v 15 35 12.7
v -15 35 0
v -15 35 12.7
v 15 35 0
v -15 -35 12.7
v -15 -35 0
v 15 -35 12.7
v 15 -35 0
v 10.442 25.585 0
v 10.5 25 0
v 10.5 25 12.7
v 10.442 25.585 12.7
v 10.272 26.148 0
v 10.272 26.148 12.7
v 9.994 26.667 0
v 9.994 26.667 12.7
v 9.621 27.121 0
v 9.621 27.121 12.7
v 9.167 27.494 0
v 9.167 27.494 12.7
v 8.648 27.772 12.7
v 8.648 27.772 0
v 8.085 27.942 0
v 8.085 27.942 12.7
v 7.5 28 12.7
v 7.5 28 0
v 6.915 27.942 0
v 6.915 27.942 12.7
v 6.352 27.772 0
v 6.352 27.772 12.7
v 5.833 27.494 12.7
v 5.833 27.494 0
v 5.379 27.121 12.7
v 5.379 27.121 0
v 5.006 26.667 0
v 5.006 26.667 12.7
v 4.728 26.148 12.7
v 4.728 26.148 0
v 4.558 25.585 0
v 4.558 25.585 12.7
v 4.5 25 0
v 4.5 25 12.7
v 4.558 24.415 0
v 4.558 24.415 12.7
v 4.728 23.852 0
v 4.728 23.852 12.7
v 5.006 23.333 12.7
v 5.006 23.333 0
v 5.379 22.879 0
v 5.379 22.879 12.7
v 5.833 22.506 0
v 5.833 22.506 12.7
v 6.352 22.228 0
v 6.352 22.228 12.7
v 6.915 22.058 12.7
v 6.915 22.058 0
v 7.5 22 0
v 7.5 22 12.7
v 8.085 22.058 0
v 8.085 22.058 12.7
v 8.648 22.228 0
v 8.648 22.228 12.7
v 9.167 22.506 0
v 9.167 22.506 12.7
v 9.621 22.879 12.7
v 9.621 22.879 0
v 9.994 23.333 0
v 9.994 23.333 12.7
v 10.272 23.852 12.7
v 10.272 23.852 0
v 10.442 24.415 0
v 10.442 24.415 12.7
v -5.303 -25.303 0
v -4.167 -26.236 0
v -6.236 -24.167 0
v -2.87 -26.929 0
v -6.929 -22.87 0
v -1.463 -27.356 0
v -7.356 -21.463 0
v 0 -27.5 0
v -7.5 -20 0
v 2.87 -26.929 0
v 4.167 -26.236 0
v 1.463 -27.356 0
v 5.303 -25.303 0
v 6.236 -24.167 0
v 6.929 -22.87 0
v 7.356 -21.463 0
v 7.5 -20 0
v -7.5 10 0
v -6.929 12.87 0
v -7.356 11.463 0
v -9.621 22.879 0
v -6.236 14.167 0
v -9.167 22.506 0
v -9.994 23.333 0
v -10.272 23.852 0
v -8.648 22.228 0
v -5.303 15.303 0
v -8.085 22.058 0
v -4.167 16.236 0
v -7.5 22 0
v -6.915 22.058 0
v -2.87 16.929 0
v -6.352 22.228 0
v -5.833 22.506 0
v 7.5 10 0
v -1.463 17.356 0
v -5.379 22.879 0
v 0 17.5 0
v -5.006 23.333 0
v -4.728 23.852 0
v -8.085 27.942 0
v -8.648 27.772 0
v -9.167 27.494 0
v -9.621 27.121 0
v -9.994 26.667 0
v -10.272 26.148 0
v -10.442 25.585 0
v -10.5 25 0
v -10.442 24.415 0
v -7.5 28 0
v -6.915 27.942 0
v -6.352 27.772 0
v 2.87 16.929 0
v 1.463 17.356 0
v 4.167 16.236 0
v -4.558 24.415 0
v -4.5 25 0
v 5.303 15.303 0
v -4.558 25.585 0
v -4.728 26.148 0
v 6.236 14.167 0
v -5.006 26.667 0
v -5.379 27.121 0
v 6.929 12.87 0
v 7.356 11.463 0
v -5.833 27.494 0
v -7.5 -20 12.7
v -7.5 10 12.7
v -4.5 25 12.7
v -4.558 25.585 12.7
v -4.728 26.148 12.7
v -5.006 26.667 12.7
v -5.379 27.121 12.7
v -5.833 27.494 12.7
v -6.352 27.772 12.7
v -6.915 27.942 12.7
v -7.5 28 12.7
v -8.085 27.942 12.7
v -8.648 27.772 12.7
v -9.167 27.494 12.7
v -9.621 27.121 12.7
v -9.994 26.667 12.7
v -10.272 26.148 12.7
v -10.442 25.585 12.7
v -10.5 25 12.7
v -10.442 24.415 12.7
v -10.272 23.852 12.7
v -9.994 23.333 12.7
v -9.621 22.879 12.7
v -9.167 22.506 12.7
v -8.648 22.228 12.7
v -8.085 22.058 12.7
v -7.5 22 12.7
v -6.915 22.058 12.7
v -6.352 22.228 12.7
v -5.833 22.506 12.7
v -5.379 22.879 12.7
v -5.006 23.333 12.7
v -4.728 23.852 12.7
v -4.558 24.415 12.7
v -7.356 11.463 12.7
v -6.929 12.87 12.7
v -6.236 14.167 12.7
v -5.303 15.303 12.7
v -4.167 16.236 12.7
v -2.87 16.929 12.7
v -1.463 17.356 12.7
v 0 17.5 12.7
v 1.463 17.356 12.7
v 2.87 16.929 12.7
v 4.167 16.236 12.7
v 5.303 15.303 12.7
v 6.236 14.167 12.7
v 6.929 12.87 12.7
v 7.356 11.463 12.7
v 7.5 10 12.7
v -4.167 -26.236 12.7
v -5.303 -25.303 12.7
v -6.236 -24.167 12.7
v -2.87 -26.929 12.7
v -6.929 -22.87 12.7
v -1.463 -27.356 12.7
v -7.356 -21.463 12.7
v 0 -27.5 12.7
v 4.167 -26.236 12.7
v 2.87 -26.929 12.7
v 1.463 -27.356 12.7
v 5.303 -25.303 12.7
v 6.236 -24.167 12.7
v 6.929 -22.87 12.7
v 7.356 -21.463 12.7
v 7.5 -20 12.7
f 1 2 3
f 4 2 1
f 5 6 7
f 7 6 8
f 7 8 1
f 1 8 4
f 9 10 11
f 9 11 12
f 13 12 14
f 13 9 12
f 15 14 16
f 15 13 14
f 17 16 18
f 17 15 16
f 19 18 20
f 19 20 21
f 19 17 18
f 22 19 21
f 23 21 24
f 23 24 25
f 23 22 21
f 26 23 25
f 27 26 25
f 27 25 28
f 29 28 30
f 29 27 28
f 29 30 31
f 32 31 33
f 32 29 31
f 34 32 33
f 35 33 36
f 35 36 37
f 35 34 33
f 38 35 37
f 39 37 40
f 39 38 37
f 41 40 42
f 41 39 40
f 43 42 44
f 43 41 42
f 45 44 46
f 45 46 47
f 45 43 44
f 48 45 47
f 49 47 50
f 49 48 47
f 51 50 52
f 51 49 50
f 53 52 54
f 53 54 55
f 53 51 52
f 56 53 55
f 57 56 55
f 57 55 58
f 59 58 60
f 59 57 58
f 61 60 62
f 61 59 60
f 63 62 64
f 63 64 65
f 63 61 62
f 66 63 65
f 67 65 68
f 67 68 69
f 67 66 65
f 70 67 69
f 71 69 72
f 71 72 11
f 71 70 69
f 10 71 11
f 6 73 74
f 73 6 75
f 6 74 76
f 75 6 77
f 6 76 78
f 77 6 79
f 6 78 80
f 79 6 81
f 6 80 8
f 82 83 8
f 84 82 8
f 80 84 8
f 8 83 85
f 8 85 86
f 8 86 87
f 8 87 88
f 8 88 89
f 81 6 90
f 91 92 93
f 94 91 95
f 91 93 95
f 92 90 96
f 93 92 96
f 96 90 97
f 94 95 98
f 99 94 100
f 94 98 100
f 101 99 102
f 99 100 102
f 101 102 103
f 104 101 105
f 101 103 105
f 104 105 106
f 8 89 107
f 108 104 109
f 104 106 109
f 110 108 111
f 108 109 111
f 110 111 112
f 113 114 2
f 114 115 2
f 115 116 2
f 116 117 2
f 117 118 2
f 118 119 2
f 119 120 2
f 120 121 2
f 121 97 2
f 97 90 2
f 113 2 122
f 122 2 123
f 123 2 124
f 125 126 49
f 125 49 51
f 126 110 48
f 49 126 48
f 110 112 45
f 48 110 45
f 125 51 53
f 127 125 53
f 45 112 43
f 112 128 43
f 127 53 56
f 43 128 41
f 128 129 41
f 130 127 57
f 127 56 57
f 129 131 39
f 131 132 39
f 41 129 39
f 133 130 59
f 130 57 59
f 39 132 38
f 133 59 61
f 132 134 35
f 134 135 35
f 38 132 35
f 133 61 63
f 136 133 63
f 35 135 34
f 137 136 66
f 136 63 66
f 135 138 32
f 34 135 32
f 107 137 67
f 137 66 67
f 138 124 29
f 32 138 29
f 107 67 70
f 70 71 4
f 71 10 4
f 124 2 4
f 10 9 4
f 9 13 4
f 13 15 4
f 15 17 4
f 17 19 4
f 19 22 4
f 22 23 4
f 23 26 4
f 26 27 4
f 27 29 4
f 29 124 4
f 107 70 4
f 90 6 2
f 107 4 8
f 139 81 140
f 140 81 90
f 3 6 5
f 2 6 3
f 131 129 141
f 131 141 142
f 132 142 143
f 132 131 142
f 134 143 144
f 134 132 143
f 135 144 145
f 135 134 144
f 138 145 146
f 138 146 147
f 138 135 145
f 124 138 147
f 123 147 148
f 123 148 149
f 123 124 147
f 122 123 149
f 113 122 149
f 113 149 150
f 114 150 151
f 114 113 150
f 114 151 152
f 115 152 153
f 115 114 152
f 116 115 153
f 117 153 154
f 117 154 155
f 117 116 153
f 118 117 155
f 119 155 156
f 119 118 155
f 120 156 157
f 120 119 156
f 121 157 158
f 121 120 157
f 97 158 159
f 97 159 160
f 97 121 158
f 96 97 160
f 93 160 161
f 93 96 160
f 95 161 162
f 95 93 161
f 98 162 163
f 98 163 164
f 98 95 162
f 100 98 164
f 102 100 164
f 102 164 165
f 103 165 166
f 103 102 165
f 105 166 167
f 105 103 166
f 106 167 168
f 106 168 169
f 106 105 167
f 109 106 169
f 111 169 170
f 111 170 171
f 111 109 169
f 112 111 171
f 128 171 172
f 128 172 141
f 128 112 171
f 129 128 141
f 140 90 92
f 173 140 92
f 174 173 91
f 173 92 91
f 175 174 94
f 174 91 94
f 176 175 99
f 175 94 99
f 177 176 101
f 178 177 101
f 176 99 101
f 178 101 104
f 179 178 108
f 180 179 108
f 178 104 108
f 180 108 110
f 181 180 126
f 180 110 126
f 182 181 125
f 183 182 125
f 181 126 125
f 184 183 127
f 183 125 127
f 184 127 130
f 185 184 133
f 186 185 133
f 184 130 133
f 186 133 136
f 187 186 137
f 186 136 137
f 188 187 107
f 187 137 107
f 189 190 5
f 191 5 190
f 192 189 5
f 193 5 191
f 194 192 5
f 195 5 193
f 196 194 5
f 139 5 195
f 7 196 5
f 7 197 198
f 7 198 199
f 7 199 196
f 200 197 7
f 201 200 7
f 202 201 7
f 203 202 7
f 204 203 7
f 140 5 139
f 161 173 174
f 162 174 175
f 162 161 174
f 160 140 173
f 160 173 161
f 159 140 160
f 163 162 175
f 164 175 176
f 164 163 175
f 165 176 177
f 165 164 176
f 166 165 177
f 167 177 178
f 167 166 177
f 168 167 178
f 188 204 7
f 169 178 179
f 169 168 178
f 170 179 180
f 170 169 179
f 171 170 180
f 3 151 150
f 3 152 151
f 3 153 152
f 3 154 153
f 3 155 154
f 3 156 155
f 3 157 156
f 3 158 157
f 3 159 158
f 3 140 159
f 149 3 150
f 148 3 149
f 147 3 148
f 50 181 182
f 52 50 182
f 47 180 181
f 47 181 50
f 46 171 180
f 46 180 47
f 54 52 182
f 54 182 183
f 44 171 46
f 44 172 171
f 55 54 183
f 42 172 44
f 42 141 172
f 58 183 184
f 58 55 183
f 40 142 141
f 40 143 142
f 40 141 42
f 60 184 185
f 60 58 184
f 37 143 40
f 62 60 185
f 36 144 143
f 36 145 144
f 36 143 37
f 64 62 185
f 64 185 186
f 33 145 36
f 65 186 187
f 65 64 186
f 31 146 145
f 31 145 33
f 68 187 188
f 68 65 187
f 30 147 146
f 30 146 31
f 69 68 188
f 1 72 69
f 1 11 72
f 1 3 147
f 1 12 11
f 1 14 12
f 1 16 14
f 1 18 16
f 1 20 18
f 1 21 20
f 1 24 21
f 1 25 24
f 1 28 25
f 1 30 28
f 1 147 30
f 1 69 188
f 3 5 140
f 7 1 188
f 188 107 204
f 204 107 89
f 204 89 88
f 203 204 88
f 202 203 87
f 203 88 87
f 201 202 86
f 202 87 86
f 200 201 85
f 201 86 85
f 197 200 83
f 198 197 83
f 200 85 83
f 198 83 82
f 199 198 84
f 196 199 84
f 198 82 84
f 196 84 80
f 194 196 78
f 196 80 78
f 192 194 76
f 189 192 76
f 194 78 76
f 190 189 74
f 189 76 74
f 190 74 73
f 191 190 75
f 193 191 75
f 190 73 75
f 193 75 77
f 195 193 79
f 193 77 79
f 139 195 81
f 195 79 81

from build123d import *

# Parameters (mm, degrees)
CROQUIS1_W              = 30
CROQUIS1_H              = 70
CROQUIS1_R              = 3
SALIENTE_EXTRUIR1_DEPTH = 12.7


with BuildPart() as part:
    # Croquis1 → Saliente-Extruir1 (new body)
    with BuildSketch(Plane.XY):
        Rectangle(CROQUIS1_W, CROQUIS1_H)
        with Locations((-7.5, 25)):
            Circle(CROQUIS1_R, mode=Mode.SUBTRACT)
        with Locations((7.5, 25)):
            Circle(CROQUIS1_R, mode=Mode.SUBTRACT)
        with BuildLine():
            Line((7.5, 10), (7.5, -20))
            ThreePointArc((7.5, -20), (0, -27.5), (-7.5, -20))
            Line((-7.5, -20), (-7.5, 10))
            ThreePointArc((-7.5, 10), (0, 17.5), (7.5, 10))
        make_face(mode=Mode.SUBTRACT)
    extrude(amount=SALIENTE_EXTRUIR1_DEPTH)


solid = part.part
